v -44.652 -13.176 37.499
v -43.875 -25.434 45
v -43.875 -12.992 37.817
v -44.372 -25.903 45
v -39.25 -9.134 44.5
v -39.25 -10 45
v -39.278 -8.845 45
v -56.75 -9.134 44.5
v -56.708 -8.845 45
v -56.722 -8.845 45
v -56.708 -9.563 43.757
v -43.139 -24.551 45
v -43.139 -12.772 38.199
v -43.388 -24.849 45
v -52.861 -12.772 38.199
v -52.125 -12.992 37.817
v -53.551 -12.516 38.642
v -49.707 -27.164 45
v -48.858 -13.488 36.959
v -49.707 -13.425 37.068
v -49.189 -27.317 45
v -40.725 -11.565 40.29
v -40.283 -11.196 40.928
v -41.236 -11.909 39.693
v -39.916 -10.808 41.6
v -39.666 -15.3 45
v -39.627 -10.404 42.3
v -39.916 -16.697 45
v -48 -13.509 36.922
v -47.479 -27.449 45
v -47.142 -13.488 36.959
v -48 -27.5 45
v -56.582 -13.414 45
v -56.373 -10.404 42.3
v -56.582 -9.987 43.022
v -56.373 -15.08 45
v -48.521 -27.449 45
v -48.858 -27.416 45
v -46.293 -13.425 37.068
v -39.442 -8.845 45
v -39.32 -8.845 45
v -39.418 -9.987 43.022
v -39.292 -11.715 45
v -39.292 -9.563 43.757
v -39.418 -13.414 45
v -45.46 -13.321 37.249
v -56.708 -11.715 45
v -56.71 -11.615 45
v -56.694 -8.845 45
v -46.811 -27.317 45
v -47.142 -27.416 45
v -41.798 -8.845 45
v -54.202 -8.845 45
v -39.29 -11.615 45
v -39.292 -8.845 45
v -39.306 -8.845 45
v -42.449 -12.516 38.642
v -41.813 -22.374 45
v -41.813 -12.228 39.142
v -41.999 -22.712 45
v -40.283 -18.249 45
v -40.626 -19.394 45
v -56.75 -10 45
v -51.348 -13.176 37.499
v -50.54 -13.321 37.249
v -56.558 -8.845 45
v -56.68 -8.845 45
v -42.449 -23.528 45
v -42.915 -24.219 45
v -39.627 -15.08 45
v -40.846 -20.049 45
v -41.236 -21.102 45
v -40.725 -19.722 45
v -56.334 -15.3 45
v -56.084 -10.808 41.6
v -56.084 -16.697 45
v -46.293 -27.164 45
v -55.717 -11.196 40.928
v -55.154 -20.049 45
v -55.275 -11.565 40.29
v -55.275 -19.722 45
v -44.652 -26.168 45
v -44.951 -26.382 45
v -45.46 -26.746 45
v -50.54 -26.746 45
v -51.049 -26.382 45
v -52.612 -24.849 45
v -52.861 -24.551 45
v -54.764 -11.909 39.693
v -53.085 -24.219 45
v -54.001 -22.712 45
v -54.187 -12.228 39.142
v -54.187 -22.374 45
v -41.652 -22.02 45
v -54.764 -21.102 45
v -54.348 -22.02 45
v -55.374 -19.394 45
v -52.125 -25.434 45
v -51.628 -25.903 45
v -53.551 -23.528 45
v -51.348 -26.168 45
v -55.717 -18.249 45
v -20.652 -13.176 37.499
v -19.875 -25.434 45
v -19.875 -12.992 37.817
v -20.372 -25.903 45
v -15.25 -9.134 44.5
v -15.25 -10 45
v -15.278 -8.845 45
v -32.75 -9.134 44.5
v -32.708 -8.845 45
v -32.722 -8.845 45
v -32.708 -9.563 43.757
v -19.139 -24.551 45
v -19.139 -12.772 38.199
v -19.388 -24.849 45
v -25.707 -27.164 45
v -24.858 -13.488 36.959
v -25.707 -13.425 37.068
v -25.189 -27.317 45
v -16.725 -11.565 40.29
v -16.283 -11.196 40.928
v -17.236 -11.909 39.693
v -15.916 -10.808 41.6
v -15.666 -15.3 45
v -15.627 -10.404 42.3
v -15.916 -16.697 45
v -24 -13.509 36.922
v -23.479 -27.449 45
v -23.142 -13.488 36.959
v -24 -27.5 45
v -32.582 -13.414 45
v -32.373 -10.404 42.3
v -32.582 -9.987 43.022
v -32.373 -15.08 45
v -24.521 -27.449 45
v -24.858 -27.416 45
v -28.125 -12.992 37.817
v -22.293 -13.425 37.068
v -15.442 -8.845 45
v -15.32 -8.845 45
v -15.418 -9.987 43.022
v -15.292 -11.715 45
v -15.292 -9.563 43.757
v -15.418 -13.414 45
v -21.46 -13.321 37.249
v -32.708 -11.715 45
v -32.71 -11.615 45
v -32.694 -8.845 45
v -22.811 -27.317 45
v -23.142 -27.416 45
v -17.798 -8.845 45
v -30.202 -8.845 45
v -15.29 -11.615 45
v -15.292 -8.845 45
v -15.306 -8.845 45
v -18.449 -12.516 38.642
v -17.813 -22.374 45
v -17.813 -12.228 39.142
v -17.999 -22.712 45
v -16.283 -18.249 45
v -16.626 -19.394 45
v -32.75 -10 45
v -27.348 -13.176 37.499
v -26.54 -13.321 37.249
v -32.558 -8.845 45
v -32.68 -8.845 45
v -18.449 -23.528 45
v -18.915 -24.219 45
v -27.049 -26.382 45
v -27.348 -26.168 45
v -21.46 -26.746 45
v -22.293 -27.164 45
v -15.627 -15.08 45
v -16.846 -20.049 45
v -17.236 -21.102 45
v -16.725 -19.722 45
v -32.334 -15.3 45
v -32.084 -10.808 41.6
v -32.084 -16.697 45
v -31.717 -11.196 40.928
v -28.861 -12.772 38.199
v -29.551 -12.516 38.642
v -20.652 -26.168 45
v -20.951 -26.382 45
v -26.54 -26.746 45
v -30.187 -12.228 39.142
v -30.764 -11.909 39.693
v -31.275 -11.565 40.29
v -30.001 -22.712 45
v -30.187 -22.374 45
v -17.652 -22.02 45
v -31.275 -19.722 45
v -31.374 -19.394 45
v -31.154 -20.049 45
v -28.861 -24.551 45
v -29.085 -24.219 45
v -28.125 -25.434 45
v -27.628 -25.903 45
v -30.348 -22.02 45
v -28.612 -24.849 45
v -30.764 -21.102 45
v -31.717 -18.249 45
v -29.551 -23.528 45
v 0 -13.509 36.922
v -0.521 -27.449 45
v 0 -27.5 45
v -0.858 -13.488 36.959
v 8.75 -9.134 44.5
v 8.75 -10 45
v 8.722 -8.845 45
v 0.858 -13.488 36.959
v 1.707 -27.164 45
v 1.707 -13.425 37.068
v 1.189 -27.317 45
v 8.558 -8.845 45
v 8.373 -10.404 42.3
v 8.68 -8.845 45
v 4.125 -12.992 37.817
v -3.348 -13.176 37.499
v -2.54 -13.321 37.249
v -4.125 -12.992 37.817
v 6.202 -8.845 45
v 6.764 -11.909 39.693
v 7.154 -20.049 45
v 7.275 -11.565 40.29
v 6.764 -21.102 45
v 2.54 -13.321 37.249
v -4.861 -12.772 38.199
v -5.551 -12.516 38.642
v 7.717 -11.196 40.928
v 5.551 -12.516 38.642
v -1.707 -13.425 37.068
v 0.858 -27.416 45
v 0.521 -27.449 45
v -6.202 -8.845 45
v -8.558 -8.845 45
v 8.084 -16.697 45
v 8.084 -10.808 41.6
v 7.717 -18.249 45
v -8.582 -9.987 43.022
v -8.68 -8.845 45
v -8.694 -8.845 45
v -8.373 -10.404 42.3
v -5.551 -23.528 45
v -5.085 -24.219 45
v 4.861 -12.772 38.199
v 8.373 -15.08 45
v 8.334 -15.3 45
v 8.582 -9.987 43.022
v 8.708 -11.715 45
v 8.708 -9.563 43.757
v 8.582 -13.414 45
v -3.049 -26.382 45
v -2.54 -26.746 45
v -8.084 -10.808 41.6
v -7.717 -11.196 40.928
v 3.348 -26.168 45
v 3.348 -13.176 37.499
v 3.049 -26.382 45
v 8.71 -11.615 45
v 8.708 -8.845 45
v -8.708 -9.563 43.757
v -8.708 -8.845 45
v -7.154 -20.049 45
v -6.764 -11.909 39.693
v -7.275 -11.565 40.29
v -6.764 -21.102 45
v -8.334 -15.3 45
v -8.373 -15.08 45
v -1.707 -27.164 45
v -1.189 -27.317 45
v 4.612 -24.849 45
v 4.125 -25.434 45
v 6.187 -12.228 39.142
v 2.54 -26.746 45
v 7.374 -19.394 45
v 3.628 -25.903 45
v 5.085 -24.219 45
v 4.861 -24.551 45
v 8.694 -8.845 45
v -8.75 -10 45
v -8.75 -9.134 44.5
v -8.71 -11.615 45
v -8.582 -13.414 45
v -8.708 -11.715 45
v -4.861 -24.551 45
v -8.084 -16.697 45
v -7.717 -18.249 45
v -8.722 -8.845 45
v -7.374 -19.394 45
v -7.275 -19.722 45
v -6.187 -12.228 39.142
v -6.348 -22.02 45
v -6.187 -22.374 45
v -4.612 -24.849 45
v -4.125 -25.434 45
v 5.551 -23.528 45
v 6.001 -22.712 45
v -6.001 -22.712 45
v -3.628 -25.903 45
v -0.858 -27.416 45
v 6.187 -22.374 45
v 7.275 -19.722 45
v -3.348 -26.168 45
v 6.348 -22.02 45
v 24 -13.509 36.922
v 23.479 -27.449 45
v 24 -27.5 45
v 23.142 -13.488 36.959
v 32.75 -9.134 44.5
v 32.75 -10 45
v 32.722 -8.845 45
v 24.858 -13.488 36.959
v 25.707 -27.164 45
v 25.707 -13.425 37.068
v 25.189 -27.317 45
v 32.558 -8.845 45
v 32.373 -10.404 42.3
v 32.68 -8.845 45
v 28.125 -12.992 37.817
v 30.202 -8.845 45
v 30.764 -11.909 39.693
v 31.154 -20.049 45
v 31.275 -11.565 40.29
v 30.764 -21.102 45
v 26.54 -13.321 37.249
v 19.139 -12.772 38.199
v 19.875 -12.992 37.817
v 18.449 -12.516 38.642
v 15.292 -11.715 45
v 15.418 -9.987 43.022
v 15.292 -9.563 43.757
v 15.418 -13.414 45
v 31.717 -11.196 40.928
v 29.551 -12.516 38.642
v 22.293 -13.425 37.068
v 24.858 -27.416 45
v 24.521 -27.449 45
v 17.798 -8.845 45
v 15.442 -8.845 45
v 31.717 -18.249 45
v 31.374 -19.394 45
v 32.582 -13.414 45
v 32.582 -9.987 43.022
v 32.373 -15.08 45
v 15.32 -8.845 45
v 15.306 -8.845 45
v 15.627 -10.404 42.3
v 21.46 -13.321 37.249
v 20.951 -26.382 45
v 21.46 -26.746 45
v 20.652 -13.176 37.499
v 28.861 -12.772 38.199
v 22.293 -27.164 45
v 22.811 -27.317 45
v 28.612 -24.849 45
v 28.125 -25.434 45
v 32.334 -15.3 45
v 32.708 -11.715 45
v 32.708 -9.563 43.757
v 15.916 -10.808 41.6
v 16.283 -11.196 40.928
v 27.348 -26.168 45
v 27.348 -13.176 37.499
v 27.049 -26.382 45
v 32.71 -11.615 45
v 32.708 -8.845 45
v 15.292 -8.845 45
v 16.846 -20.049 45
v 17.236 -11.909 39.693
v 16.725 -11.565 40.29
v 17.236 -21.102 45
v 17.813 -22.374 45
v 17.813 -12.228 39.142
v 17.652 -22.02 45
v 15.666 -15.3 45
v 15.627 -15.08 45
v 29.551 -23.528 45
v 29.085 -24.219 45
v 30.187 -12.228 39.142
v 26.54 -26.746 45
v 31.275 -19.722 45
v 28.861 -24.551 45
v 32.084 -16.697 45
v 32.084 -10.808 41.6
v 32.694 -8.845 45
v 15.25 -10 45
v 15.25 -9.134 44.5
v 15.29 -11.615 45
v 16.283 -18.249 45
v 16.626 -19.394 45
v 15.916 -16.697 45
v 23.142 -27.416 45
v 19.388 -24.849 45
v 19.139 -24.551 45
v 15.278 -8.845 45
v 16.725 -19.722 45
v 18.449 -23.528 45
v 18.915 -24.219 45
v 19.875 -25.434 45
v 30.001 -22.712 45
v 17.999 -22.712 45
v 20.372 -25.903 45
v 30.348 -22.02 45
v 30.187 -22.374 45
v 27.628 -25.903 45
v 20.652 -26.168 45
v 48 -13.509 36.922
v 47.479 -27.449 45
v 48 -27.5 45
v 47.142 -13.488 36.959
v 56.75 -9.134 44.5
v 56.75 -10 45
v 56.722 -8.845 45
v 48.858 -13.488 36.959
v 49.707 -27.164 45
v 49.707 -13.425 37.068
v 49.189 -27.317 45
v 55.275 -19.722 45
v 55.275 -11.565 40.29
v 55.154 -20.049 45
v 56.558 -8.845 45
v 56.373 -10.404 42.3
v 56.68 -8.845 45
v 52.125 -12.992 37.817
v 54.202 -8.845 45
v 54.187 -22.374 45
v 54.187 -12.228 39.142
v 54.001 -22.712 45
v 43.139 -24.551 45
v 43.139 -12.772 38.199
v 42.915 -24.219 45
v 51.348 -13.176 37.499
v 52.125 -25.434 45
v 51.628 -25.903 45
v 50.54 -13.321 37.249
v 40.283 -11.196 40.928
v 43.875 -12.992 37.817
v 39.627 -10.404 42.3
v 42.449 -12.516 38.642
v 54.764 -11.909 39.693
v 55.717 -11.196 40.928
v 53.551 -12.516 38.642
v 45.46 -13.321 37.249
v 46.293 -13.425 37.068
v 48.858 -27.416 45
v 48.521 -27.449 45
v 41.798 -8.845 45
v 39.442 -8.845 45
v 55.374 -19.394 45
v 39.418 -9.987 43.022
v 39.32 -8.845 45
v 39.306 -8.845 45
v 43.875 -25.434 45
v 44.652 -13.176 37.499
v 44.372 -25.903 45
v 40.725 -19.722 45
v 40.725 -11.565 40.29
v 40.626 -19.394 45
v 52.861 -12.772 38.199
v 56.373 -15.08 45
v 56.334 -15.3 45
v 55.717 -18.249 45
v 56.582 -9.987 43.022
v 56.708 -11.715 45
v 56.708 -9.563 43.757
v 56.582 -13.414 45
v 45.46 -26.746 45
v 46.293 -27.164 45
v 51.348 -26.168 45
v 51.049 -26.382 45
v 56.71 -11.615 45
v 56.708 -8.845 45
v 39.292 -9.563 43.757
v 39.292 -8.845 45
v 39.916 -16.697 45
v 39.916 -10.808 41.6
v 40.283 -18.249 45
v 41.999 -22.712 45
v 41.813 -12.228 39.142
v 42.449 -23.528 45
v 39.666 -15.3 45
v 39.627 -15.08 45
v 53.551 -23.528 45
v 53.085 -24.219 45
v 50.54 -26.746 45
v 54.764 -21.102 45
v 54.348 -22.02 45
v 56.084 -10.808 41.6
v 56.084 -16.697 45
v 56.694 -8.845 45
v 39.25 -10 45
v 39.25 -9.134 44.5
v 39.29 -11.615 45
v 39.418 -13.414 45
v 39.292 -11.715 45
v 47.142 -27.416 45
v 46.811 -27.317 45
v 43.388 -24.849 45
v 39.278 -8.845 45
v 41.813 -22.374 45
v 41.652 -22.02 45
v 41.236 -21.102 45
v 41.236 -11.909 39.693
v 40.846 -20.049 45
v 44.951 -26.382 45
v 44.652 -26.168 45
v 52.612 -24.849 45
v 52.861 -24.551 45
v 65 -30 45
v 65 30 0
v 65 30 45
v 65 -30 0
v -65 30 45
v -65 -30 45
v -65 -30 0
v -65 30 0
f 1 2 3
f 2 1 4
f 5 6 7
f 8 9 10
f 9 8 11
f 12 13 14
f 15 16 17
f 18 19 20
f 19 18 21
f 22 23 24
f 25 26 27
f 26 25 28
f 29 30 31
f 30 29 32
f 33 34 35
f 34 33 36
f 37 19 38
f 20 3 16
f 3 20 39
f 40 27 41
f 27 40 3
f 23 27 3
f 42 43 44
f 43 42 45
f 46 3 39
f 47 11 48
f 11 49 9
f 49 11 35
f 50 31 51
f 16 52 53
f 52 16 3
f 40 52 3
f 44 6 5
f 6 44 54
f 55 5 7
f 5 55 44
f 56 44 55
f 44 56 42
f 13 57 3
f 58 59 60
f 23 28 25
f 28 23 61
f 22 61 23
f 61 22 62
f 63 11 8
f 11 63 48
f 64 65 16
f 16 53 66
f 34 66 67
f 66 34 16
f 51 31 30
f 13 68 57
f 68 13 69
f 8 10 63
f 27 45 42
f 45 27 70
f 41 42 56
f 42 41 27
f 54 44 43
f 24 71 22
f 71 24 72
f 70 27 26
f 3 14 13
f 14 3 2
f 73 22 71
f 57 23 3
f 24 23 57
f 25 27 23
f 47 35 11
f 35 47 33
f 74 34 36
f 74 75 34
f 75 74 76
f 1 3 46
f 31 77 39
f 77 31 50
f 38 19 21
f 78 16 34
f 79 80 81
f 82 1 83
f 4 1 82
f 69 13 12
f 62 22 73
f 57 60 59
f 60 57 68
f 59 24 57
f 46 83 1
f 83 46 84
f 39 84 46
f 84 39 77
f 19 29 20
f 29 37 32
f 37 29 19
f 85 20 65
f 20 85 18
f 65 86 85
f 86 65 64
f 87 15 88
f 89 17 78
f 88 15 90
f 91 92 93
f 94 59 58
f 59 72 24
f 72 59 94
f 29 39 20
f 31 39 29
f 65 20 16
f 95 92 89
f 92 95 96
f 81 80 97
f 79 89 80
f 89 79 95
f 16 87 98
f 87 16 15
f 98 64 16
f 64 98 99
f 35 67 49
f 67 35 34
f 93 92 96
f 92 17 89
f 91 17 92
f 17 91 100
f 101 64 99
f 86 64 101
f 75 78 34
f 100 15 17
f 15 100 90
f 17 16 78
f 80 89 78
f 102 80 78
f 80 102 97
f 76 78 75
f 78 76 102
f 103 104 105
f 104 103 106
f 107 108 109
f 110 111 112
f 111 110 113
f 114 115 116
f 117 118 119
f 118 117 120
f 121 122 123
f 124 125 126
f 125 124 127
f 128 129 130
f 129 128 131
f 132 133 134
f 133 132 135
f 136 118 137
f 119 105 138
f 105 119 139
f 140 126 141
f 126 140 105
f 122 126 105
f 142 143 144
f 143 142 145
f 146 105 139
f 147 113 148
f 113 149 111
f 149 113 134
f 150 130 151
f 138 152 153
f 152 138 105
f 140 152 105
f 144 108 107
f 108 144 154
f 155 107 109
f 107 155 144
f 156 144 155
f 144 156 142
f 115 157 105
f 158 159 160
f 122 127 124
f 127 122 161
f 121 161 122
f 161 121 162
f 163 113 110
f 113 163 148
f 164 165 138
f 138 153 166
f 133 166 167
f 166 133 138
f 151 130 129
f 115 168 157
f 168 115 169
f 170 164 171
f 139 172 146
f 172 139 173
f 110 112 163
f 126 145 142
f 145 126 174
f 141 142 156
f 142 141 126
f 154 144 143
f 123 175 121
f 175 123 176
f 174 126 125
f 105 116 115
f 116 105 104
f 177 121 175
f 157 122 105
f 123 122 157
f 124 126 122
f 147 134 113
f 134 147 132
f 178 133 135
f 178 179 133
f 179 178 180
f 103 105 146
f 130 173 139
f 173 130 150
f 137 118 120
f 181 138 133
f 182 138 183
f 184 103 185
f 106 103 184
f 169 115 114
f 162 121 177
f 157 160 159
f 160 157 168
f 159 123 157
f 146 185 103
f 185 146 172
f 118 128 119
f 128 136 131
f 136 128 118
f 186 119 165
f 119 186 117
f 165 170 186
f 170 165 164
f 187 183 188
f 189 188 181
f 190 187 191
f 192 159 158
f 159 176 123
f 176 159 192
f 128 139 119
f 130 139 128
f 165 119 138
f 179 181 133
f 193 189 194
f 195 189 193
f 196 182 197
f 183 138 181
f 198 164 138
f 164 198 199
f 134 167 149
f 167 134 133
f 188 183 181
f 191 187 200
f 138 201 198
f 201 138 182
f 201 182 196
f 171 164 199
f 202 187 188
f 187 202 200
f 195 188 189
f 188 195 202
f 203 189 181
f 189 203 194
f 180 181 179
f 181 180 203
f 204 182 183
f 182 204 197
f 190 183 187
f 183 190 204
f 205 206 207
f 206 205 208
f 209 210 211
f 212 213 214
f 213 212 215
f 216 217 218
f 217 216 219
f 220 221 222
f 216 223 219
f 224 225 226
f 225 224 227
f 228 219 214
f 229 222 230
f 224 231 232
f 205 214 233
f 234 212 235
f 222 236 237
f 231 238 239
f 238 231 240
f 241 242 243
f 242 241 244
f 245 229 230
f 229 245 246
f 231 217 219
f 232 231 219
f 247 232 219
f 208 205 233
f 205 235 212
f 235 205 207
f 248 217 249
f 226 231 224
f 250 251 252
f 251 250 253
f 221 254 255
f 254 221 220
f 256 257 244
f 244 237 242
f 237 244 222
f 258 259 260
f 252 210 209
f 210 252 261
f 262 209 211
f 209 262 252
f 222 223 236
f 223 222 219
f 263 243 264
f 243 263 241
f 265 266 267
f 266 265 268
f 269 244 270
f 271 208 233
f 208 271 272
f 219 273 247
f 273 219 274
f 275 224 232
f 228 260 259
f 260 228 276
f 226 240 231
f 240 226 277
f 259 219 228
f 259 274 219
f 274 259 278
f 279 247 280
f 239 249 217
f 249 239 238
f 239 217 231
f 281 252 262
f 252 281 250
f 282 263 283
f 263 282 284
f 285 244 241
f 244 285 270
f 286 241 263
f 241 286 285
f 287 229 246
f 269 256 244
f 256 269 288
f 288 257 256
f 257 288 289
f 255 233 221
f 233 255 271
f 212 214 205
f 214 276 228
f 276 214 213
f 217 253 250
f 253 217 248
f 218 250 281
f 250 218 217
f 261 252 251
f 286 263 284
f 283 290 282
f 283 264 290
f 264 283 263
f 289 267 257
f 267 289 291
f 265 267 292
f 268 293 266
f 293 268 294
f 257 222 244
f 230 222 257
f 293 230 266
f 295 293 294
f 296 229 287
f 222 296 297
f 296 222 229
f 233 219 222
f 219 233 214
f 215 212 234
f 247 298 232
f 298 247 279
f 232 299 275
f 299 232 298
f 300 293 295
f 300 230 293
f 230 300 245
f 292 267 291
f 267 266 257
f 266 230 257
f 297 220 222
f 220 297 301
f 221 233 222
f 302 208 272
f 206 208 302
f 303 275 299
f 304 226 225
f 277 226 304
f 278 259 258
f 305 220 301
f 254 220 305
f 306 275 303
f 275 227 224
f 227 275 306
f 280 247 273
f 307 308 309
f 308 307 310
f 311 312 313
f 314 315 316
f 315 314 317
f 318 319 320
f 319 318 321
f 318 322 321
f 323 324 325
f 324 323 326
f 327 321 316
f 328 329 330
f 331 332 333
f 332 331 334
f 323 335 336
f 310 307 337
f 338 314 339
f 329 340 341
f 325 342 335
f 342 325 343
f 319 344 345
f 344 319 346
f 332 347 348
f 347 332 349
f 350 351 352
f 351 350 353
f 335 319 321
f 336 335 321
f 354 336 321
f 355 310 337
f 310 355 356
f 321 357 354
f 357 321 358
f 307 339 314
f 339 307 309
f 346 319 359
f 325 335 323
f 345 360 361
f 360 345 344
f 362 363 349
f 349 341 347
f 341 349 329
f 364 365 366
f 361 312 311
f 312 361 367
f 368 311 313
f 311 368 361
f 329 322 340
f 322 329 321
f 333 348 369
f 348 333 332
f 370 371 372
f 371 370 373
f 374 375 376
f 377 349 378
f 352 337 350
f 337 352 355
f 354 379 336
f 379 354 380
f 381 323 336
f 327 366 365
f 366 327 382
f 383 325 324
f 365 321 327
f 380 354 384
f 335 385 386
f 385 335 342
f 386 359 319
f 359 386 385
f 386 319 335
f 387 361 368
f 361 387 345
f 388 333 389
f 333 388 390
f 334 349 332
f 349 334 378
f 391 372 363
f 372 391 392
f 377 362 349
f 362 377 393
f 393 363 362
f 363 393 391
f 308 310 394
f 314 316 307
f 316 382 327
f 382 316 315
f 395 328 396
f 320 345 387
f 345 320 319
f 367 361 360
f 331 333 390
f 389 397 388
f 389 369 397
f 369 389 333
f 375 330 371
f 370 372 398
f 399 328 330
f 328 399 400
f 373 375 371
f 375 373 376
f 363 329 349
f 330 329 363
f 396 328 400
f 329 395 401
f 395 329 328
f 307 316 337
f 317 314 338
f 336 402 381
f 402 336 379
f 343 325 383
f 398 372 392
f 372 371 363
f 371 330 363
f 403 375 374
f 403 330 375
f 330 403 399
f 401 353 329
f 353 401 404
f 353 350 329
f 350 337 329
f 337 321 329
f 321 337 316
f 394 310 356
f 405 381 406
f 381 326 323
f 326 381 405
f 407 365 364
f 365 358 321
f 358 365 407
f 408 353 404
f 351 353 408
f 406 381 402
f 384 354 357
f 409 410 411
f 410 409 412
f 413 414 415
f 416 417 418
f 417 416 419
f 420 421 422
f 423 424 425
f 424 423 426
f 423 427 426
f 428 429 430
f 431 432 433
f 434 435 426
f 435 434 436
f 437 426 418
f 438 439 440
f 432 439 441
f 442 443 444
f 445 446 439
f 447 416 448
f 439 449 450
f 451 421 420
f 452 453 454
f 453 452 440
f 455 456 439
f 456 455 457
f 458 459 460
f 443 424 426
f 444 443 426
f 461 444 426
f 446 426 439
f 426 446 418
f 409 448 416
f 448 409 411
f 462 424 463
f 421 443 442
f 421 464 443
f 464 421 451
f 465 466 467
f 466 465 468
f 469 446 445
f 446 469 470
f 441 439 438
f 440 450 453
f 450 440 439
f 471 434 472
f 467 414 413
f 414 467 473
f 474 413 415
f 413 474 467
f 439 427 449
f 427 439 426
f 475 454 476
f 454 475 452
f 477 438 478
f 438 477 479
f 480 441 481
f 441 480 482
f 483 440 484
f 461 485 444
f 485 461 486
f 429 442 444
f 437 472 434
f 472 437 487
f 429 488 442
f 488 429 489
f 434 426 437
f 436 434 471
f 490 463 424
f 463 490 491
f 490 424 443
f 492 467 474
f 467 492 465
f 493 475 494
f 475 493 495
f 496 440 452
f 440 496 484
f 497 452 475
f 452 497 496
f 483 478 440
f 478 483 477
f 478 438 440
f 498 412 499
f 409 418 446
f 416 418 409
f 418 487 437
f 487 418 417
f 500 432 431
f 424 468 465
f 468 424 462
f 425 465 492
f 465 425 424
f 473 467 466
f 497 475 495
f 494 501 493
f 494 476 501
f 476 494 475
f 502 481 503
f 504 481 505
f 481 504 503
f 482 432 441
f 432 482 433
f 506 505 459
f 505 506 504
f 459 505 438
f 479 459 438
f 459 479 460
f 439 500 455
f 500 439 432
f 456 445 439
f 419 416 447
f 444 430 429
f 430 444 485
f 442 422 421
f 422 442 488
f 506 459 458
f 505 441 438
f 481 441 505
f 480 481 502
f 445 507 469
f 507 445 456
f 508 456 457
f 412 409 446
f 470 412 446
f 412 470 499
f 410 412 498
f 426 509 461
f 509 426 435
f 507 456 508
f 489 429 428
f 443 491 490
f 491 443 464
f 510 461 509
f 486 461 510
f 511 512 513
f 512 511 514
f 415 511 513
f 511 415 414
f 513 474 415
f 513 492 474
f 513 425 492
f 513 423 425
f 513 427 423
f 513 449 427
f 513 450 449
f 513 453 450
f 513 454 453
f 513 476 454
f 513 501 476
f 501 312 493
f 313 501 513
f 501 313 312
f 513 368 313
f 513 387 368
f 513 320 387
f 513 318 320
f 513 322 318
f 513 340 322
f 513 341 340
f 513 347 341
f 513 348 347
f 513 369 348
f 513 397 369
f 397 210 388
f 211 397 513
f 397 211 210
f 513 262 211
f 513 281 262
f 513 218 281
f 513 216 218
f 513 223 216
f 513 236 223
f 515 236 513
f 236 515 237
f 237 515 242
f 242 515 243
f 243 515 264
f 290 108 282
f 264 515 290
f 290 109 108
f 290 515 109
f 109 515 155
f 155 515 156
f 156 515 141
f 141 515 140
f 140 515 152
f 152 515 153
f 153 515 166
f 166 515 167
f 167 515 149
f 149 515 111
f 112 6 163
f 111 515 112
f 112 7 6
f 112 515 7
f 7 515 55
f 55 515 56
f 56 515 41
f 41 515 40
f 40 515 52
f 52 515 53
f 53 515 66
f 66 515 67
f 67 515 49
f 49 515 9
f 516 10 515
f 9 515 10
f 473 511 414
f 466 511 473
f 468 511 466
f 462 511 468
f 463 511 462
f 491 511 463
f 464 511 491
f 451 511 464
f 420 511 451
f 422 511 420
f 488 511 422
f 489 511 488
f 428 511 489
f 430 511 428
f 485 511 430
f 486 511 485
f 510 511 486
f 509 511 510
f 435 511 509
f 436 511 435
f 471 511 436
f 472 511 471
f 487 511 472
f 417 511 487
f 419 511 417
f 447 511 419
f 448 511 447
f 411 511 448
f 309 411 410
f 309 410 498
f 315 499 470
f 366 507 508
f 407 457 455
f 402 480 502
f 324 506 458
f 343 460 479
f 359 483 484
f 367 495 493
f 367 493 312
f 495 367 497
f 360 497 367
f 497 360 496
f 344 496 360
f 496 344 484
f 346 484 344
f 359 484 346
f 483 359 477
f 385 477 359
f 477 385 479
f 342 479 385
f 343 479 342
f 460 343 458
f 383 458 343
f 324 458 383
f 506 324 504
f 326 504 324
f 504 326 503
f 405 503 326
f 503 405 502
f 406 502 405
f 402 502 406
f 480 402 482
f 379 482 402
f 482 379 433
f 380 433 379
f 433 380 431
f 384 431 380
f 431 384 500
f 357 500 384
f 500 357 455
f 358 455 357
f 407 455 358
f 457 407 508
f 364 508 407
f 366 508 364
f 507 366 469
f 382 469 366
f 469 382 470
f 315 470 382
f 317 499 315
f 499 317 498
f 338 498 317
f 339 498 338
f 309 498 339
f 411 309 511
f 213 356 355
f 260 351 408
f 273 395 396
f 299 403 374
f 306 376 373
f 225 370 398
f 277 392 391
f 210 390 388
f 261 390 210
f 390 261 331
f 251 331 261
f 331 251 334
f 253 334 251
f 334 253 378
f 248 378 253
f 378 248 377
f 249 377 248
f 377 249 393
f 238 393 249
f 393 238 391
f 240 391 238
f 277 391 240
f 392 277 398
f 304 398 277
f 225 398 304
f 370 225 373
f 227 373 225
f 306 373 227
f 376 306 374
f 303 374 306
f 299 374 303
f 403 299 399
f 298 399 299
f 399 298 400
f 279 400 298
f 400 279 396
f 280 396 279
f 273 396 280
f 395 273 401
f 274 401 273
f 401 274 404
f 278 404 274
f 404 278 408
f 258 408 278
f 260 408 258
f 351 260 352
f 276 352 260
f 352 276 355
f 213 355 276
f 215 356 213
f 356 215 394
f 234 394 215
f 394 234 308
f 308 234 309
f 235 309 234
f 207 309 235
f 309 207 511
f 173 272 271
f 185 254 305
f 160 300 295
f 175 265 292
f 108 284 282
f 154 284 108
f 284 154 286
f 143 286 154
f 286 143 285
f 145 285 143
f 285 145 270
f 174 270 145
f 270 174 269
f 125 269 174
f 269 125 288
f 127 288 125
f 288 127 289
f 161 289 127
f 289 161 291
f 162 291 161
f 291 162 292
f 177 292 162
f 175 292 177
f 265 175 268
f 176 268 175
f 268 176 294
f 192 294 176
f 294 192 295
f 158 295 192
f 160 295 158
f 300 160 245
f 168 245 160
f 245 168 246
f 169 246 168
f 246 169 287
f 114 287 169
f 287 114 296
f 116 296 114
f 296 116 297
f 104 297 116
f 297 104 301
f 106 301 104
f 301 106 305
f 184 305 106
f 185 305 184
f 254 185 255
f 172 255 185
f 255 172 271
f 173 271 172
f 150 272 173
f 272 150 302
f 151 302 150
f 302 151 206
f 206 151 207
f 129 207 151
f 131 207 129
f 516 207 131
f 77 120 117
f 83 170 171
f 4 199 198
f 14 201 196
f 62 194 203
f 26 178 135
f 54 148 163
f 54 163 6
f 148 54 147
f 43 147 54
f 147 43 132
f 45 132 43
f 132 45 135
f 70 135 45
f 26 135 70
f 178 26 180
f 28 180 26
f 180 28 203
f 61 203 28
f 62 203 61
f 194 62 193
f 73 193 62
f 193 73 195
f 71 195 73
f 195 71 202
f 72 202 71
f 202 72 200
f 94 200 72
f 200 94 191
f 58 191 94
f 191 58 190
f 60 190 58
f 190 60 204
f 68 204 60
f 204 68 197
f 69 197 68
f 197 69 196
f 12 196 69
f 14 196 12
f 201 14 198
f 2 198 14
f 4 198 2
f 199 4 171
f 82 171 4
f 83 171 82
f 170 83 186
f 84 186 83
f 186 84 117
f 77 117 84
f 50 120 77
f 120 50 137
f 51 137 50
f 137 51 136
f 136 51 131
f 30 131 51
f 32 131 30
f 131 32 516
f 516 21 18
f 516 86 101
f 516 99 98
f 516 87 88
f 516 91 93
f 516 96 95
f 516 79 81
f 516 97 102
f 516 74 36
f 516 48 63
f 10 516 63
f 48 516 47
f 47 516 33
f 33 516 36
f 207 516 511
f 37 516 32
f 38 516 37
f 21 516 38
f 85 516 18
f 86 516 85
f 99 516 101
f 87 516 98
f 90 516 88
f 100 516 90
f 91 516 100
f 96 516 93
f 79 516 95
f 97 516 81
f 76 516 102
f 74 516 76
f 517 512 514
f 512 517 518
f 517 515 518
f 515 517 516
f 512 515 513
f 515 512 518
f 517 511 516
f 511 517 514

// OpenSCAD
// 15mL Conical Tube Rack - Corrected Final
// Designed for easy volume reading and supernatant removal.

// --- Dimensions ---
L = 130;            // Length along X (mm)
W = 60;             // Depth along Y (mm)
H = 45;            // Height along Z (mm)

num_holes = 5;      // Number of tube holes
spacing = 24;       // Spacing between hole centers along X (mm)

hole_d = 17.5;      // Diameter of the holes (mm)
hole_depth = 40;    // Depth of the holes (mm)
tilt_angle = 30;    // Tilt angle from vertical (degrees)
y_top_offset = -10; // Y position where hole axis meets top face

// --- Parameters ---
$fn = 64;

// Calculate the starting X position to center the holes
hole_x_start = -(num_holes - 1) / 2 * spacing;

// --- Modeling ---

difference() {
    // The main block
    // Centered on X and Y, sitting on Z=0
    translate([-L/2, -W/2, 0])
        cube([L, W, H]);

    // The five blind holes
    for (i = [0 : num_holes - 1]) {
        let (
            current_x = hole_x_start + (i * spacing),
            current_y = y_top_offset
        )
        // To ensure the hole axis meets the top face at (current_x, current_y, H):
        // 1. We translate to the target point.
        // 2. We rotate around the X axis.
        // 3. We must adjust the Z translation because rotating a cylinder 
        //    around its end-point changes its Z-extent.
        // To make the cylinder's top face lie on the plane Z=H:
        // We rotate the cylinder first, then translate it.
        
        // A cylinder of height 'h' rotated by 'theta' around X:
        // The center of the top face (originally at 0,0,h) 
        // moves to (0, h*sin(theta), h*cos(theta)).
        // To bring that point to (0, 0, H), we translate by (0, -h*sin(theta), H - h*cos(theta)).
        // However, it is simpler to:
        // 1. Translate to target X, Y.
        // 2. Rotate.
        // 3. Translate Z so the top face is at H.
        
        translate([current_x, current_y, H])
        rotate([tilt_angle, 0, 0])
        // We subtract the cylinder from the block. 
        // To ensure the top is perfectly flat and cuts through, 
        // we start the cylinder at Z=0 (relative to rotation) and go to hole_depth.
        // But we need to offset it so the top face is at the block surface.
        // Since we rotated around the point [current_x, current_y, H], 
        // the cylinder's base is at the top face.
        // To make it go DOWN, we must use a negative height or translate.
        // Let's use: translate to top, rotate, then translate down by the tilt offset.
        
        // Correct approach:
        // The cylinder is created from Z=0 to Z=hole_depth.
        // We rotate it around the X axis.
        // Then we translate it so that the point (0,0,0) is at (current_x, current_y, H).
        // This makes the cylinder start at the top face and tilt "down and forward".
        // To ensure it cuts through the top face cleanly, we extend it slightly.
        translate([0, 0, 0])
        rotate([tilt_angle, 0, 0])
        translate([0, 0, -1]) // Small overlap to ensure clean cut
        cylinder(h = hole_depth + 1, d = hole_d);
    }
}

// Note on tilt: 
// rotate([30, 0, 0]) rotates the Z-axis towards the Y-axis.
// The cylinder starts at Z=0 (the top face) and goes to Z=hole_depth.
// Because we rotate around the point [current_x, current_y, H], 
// the cylinder's top face is at Z=H.
// The rotation [30, 0, 0] makes the cylinder go from (0,0,0) to (0, sin(30), cos(30)) 
// in local coordinates.
// Since we want it to go DOWN (towards -Z), we must rotate by -30 or 
// use a cylinder that goes from 0 to -depth.
// Let's use: rotate([tilt_angle, 0, 0]) and cylinder(h = hole_depth, ...)
// but we must realize that rotate([30,0,0]) makes the Z axis point "up and forward".
// To go "down and forward", we rotate by -30 or rotate by 30 and use negative Z.
// Let's use: rotate([tilt_angle, 0, 0]) and translate the cylinder to start at Z=0 
// and go to Z=-hole_depth.

// RE-RE-CORRECTION:
// The user wants: "going down into the block, it moves toward +Y".
// If we are at the top face (Z=H) and move down (-Z), we want Y to increase (+Y).
// A rotation of -30 degrees around X:
// Vector [0, 0, -1] rotated by -30 around X:
// Y_new = 0*cos(-30) + (-1)*sin(-30) = 0.5 (Positive!)
// Z_new = -0*sin(-30) + (-1)*cos(-30) = -0.8
